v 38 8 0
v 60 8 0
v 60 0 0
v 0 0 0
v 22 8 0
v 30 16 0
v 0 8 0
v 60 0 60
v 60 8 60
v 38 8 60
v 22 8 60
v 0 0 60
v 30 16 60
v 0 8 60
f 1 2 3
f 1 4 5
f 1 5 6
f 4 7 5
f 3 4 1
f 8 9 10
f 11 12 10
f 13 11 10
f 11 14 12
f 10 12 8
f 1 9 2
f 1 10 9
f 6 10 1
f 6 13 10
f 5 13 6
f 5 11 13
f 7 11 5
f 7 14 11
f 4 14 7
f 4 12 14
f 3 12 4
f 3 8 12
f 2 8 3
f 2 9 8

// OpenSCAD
$fn = 32;

// ----------------------------------------------------------------------
// V guide rail: vrib, 60 mm wide
// ----------------------------------------------------------------------

// --- parameters (mm) ---
rail_w = 60;              // rail width, X
base_t = 8;               // base plate thickness
v_depth = 8;              // V feature depth / height
v_half_w = 8;             // half width of the V at the base face
plate_t = 60;             // rail length, Z (the extrusion height)

profile = [[0, 0], [60, 0], [60, 8], [38, 8], [30, 16], [22, 8], [0, 8]];  // primary outline, 7 points, counter clockwise

// --- the one profile operation ---
linear_extrude(height = plate_t) polygon(points = profile);
